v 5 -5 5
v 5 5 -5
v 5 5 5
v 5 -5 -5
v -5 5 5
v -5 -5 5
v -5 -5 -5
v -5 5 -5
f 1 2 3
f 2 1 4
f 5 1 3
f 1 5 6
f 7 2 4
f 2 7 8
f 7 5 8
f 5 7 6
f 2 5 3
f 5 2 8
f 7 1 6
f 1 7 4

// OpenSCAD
// -------------------------------------+---------------------------------------+---------------------------------------+---------------------------------------
// Title:        Parametric Test Block
// Version:      1.0
// Release Date: 2017-04-02 (ISO)
// Author:       Rohin Gosling
// -------------------------------------+---------------------------------------+---------------------------------------+---------------------------------------
//
// Description:
//
// - Simple 3D object generator, to generate test and calibration parts for 3D printers.
//
// Release Notes:
//
// - Version 1.0
//   * Model created.
//
// -------------------------------------+---------------------------------------+---------------------------------------+---------------------------------------

// -------------------------------------+---------------------------------------+---------------------------------------+---------------------------------------
// Constants:
// -------------------------------------+---------------------------------------+---------------------------------------+---------------------------------------

// System constants.

C_CONSTANT = 0 + 0;     // Used to hide constant values from Thingiverse. Add to other constants to hide them as well.

// General constants.

C_NONE = C_CONSTANT + 0;

// SCG constants.

SCG_OVERLAP = C_CONSTANT + 0.01;    // Used for overlapping Boolean operations in order to avoid Boolean edge artefacts.

// Shape

C_SHAPE_NONE      = C_CONSTANT + 0;
C_SHAPE_CUBOID    = C_CONSTANT + 1;
C_SHAPE_CYLINDER  = C_CONSTANT + 2;
C_SHAPE_PYRAMID   = C_CONSTANT + 3;
C_SHAPE_PRISM     = C_CONSTANT + 4;
C_SHAPE_ELLIPSOID = C_CONSTANT + 5;
C_SHAPE_TORUS     = C_CONSTANT + 6;

// Minimum and maximum constraints.

C_RESOLUTION_MIN  = C_CONSTANT + 8;
C_RESOLUTION_MAX  = C_CONSTANT + 64;
C_SIZE_MIN        = C_CONSTANT + 1.0;
C_SIDE_COUNT_MIN  = C_CONSTANT + 3;
C_SIDE_COUNT_MAX  = C_CONSTANT + 12;


// -------------------------------------+---------------------------------------+---------------------------------------+---------------------------------------
// Thingiverse Parameters.
//
// - These parameters are used to integrate with the Thingiverse Customizer, and should only be used by the
//   class member variables specified in the "Model parameters" section below.
//
// - These Thingiverse Parameters should never be accessed from inside any module. We do this to enforce 
//   principles of object orientation.
//
// - By separating concerns between variables exposed to Thingiverse vs. variables used internally by the 
//   SCAD model (class), we are better able to manage the ordering and grouping of variables exposed to 
//   Thingiverse, vs. the ordering and constraints of variables used internally by the model.
//
// -------------------------------------+---------------------------------------+---------------------------------------+---------------------------------------

/* [Assembbly Parameters] */

object_shape    = 1;        // [ 1:Cuboid, 2:Cylinder, 3:Pyramid, 4:Prism, 5:Ellipsoid, 6:Torus ]
x_bore_shape    = 0;        // [ 0: None, 2:Cylinder, 4:Prism ]
y_bore_shape    = 0;        // [ 0: None, 2:Cylinder, 4:Prism ]
z_bore_shape    = 0;        // [ 0: None, 2:Cylinder, 4:Prism ]
resolution      = 128;

/* [Cuboid Parameters] */

cuboid_x      = 10.0;
cuboid_y      = 10.0;
cuboid_z      = 10.0;
cuboid_fillet = 0.0;

/* [Cylinder Parameters] */

cylinder_diameter_base = 20.0;
cylinder_diameter_top  = 20.0;
cylinder_height        = 20.0;

/* [Pyramid Parameters] */

pyramid_side_count  = 4;
pyramid_side_length = 20.0;
pyramid_height      = 20.0;

/* [Prism Parameters] */

prism_side_count  = 3;
prism_side_length = 20.0;
prism_height      = 20.0;

/* [Ellipsoid Parameters] */

ellipsoid_diameter_x = 20.0;
ellipsoid_diameter_y = 20.0;
ellipsoid_diameter_z = 20.0;

/* [Torus Parameters] */

torus_major_radius = 12.0;
torus_minor_radius = 6.0;

/* [Bore Parameters] */

x_bore_diameter         = 10;
y_bore_diameter         = 10;
z_bore_diameter         = 10;
x_bore_prism_side_count = 4;
y_bore_prism_side_count = 4;
z_bore_prism_side_count = 4;

// -------------------------------------+---------------------------------------+---------------------------------------+---------------------------------------
// Model parameters and geometric constraints. (Class member variables).
//
// - If we treat an OpenSCAD file as though it is an object oriented class, then we can prefix global variables
//   with "m_", to denote class membership. 
//   - As an alternative to "m_", we could also use "this_" as a standard. However, "m_" is shorter and faster to type.
//   - Another advantage of this convention, is that we can arrange parameters meant for display in Thingiverse, in 
//     an order that makes sense to the user, while arranging the member versions of the parameters in an order
//     that better accommodates constraint computation.
//
// - Once we have defined global variables as member variables of a class, in this case the class represented
//   by the SCAD file, then we are free to better manage global vs local scope of class member 
//   variables, vs. local module (method) variables.
//
// - Thingiverse only integrates constant literal values. So as long as we reference other parameters or 
//   initialize variables as expressions, then none of these will appear in the Thingiverse customizer.
//
// -------------------------------------+---------------------------------------+---------------------------------------+---------------------------------------

// Assembly Parameters

m_object_shape    = object_shape;
m_x_bore_shape    = x_bore_shape;
m_y_bore_shape    = y_bore_shape;
m_z_bore_shape    = z_bore_shape;
m_resolution      = clip ( resolution, C_RESOLUTION_MIN, C_RESOLUTION_MAX );

// Cuboid Parameters.

m_cuboid_x             = ( cuboid_x < C_SIZE_MIN ) ? C_SIZE_MIN : cuboid_x;
m_cuboid_y             = ( cuboid_y < C_SIZE_MIN ) ? C_SIZE_MIN : cuboid_y;
m_cuboid_z             = ( cuboid_z < C_SIZE_MIN ) ? C_SIZE_MIN : cuboid_z;
m_cuboid_min_dimention = ( m_cuboid_x < m_cuboid_y && m_cuboid_x < m_cuboid_z ) ? m_cuboid_x : ( m_cuboid_y < m_cuboid_x && m_cuboid_y < m_cuboid_z ) ? m_cuboid_y : m_cuboid_z;
m_cuboid_fillet        = clip ( cuboid_fillet, 0.0, m_cuboid_min_dimention/2.0 );

// Cylinder Parameters.

m_cylinder_diameter_base = ( cylinder_diameter_base < 0.0 ) ? 0.0 : cylinder_diameter_base;
m_cylinder_diameter_top  = ( cylinder_diameter_top  < 0.0 ) ? 0.0 : cylinder_diameter_top;
m_cylinder_height        = ( cylinder_height < C_SIZE_MIN ) ? C_SIZE_MIN : cylinder_height;

// Pyramid Parameters.

m_pyramid_side_count  = clip ( pyramid_side_count, C_SIDE_COUNT_MIN, C_SIDE_COUNT_MAX );
m_pyramid_side_length = ( pyramid_side_length < C_SIZE_MIN ) ? C_SIZE_MIN : pyramid_side_length;
m_pyramid_height      = ( pyramid_height < C_SIZE_MIN ) ? C_SIZE_MIN : pyramid_height;

// Prism Parameters.

m_prism_side_count  = clip ( prism_side_count, C_SIDE_COUNT_MIN, C_SIDE_COUNT_MAX );
m_prism_side_length = ( prism_side_length < C_SIZE_MIN ) ? C_SIZE_MIN : prism_side_length;
m_prism_height      = ( prism_height < C_SIZE_MIN ) ? C_SIZE_MIN : prism_height;

// Ellipsoid Parameters.

m_ellipsoid_diameter_x = ( ellipsoid_diameter_x < C_SIZE_MIN ) ? C_SIZE_MIN : ellipsoid_diameter_x;
m_ellipsoid_diameter_y = ( ellipsoid_diameter_y < C_SIZE_MIN ) ? C_SIZE_MIN : ellipsoid_diameter_y;
m_ellipsoid_diameter_z = ( ellipsoid_diameter_z < C_SIZE_MIN ) ? C_SIZE_MIN : ellipsoid_diameter_z;

// Torus Parameters.

m_torus_major_radius = ( torus_major_radius < C_SIZE_MIN ) ? C_SIZE_MIN : torus_major_radius;
m_torus_minor_radius = ( torus_minor_radius < C_SIZE_MIN ) ? C_SIZE_MIN : torus_minor_radius;

// Bore.

m_x_bore_diameter         = ( x_bore_diameter < C_SIZE_MIN ) ? C_SIZE_MIN : x_bore_diameter;
m_y_bore_diameter         = ( y_bore_diameter < C_SIZE_MIN ) ? C_SIZE_MIN : y_bore_diameter;
m_z_bore_diameter         = ( z_bore_diameter < C_SIZE_MIN ) ? C_SIZE_MIN : z_bore_diameter;
m_x_bore_prism_side_count = clip ( x_bore_prism_side_count, C_SIDE_COUNT_MIN, C_SIDE_COUNT_MAX );
m_y_bore_prism_side_count = clip ( y_bore_prism_side_count, C_SIDE_COUNT_MIN, C_SIDE_COUNT_MAX );
m_z_bore_prism_side_count = clip ( z_bore_prism_side_count, C_SIDE_COUNT_MIN, C_SIDE_COUNT_MAX );

// -------------------------------------+---------------------------------------+---------------------------------------+---------------------------------------
// DEBUG: Console Output. 
// -------------------------------------+---------------------------------------+---------------------------------------+---------------------------------------

C_DEBUG_ENABLED = false;

if ( C_DEBUG_ENABLED )
{
    //echo ( m_x = m_x ); 
}

// -------------------------------------+---------------------------------------+---------------------------------------+---------------------------------------
// Module:      Main
// Module Type: Model
//
// Description:
//
// - Program entry point.
//
// -------------------------------------+---------------------------------------+---------------------------------------+---------------------------------------

main();

module main ()
{   
    // Initialize model resolution.
    
    $fn = m_resolution;
    
    // Generate hinge assembly.
        
    assembly ();    
}

// -------------------------------------+---------------------------------------+---------------------------------------+---------------------------------------
// Module:      assembly_main
// Module Type: Assembly
//
// Description:
//
// - Main component assembly.
//
// Parameters:
//
// - N/A
//
// -------------------------------------+---------------------------------------+---------------------------------------+---------------------------------------

module assembly ()
{
    if      ( m_object_shape == C_SHAPE_NONE )      object_none ();
    else if ( m_object_shape == C_SHAPE_CUBOID )    object_cuboid ();
    else if ( m_object_shape == C_SHAPE_CYLINDER )  object_cylinder ();
    else if ( m_object_shape == C_SHAPE_PYRAMID )   object_pyramid ();
    else if ( m_object_shape == C_SHAPE_PRISM )     object_prism ();
    else if ( m_object_shape == C_SHAPE_ELLIPSOID ) object_ellipsoid ();
    else if ( m_object_shape == C_SHAPE_TORUS )     object_torus ();    
    else if ( m_object_shape == C_SHAPE_NONE )      object_none ();    
}

// -------------------------------------+---------------------------------------+---------------------------------------+---------------------------------------
// Module:      object_none
// Module Type: Object
//
// Description:
//
// - Placeholder module for dealing with zero object selection.
//
// Parameters:
//
// - N/A
//
// -------------------------------------+---------------------------------------+---------------------------------------+---------------------------------------

module object_none ()
{
}

// -------------------------------------+---------------------------------------+---------------------------------------+---------------------------------------
// Module:      object_cuboid
// Module Type: Object
//
// Description:
//
// - Cuboid object defined by width, length, height and fillet size.
//
// Parameters:
//
// - N/A
//
// -------------------------------------+---------------------------------------+---------------------------------------+---------------------------------------

module object_cuboid ()
{
    // Initialize parameters.
    
    sf = m_cuboid_fillet;
    sx = m_cuboid_x;
    sy = m_cuboid_y;
    sz = m_cuboid_z;
    
    // Generate object.

    difference ()
    {
        // Generate base object.
        
        if ( sf > 0 )
        {
            object_cuboid_filleted ();
        }
        else
        {
            cube ( size = [ sx, sy, sz ], center = true );
        }
        
        // Subtract bores.
        
        cutting_tool_bore ( sx, sy, sz );
    }
}

// -------------------------------------+---------------------------------------+---------------------------------------+---------------------------------------
// Module:      object_cuboid_filleted
// Module Type: Object
//
// Description:
//
// - Used by the Cuboid object, to implement fillets.
//
// Parameters:
//
// - N/A
//
// -------------------------------------+---------------------------------------+---------------------------------------+---------------------------------------

module object_cuboid_filleted ()
{
    // Local constants.
    
    EDGE_CENTER = 0;    
    EDGE_ANGLE  = 1;
    EDGE_LENGTH = 2;
    
    // Initialize parameters.
    
    sf = m_cuboid_fillet;
    sx = m_cuboid_x;
    sy = m_cuboid_y;
    sz = m_cuboid_z;
    
    // Generate object.

    difference ()
    {
        // Generate base object.
        
        union ()
        {
            // Create cube work pieces.
            
            c = 2.0*sf;
            cube ( size = [ sx,     sy - c, sz - c ], center = true );
            cube ( size = [ sx - c, sy - c, sz     ], center = true );
            cube ( size = [ sx - c, sy,     sz - c ], center = true );
            
            // Create fillets.
            
            rx = sx/2.0 - sf;
            ry = sy/2.0 - sf;
            rz = sz/2.0 - sf;
            
            ex = m_cuboid_x - 2.0*sf;
            ey = m_cuboid_y - 2.0*sf;;
            ez = m_cuboid_z - 2.0*sf;;
            
            // Create vertex fillets.
            
            n_vertex = 8;
            v_vertex =
            [
                [ rx, ry,  rz ],[ -rx, ry,  rz ], [ -rx, -ry,  rz ], [ rx, -ry,  rz ],
                [ rx, ry, -rz ],[ -rx, ry, -rz ], [ -rx, -ry, -rz ], [ rx, -ry, -rz ]
            ];
                              
            for ( i = [ 0 : n_vertex - 1 ] )
            {
                translate ( v_vertex [ i ] ) sphere ( r = sf, center = true );
            }
            
            // Create edge fillets.
            
            n_edge = 12;
            v_edge =
            [
                [ [  rx,  ry, 0.0 ], [  0.0,  0.0, 0.0 ], ez ], [ [ -rx,  ry, 0.0 ], [  0.0,  0.0, 0.0 ], ez ],
                [ [  rx, -ry, 0.0 ], [  0.0,  0.0, 0.0 ], ez ], [ [ -rx, -ry, 0.0 ], [  0.0,  0.0, 0.0 ], ez ],
                [ [  rx, 0.0,  rz ], [ 90.0,  0.0, 0.0 ], ey ], [ [  rx, 0.0, -rz ], [ 90.0,  0.0, 0.0 ], ey ],
                [ [ -rx, 0.0,  rz ], [ 90.0,  0.0, 0.0 ], ey ], [ [ -rx, 0.0, -rz ], [ 90.0,  0.0, 0.0 ], ey ],
                [ [ 0.0,  ry,  rz ], [  0.0, 90.0, 0.0 ], ex ], [ [ 0.0,  ry, -rz ], [  0.0, 90.0, 0.0 ], ex ],
                [ [ 0.0, -ry,  rz ], [  0.0, 90.0, 0.0 ], ex ], [ [ 0.0, -ry, -rz ], [  0.0, 90.0, 0.0 ], ex ]
            ];
            
            for ( i = [ 0 : n_edge - 1 ] )
            {
                v = v_edge [ i ][ EDGE_CENTER ];
                a = v_edge [ i ][ EDGE_ANGLE  ];
                s = v_edge [ i ][ EDGE_LENGTH ];
                
                echo ( a = a );
                
                translate ( v ) rotate ( a ) cylinder ( r = sf, h = s, center = true );
            }
            
        }
        
        // Subtract bores.
        
        cutting_tool_bore ( sx, sy, sz );
    }
}

// -------------------------------------+---------------------------------------+---------------------------------------+---------------------------------------
// Module:      object_cylinder
// Module Type: Object
//
// Description:
//
// - Cylinder object defined by base diameter, top diameter and height.
//
// Parameters:
//
// - N/A
//
// -------------------------------------+---------------------------------------+---------------------------------------+---------------------------------------

module object_cylinder ()
{
    // Initialize parameters.
    
    d1 = m_cylinder_diameter_base;
    d2 = m_cylinder_diameter_top;
    h  = m_cylinder_height;
    
    // Generate object.
    
    difference ()
    {
        // Generate base object.
        
        cylinder ( d1 = d1, d2 = d2, h = h, center = true );
        
        // Subtract bores.
        
        d_max = ( d1 > d2 ) ? d1 : d2;
        cutting_tool_bore ( sx = d_max, sy = d_max, sz = h );
    }
}

// -------------------------------------+---------------------------------------+---------------------------------------+---------------------------------------
// Module:      object_pyramid
// Module Type: Object
//
// Description:
//
// - Pyramid object defined by height, side length, and side count.
//
// Parameters:
//
// - N/A
//
// -------------------------------------+---------------------------------------+---------------------------------------+---------------------------------------

module object_pyramid ()
{
    // Initialize parameters.
    
    n = m_pyramid_side_count;    
    s = m_pyramid_side_length;
    h = m_pyramid_height;
    t = 180/n;
    
    // Compute base diameter based on side length.
        
    d1 = s/sin(180/n);
    d2 = 0;
    
    // Generate object.
    
    difference ()
    {
        // Generate base object.
        
        rotate ( [ 0, 0, t ] ) cylinder ( d1 = d1, d2 = d2, h = h, $fn = n, center = true );
        
        // Subtract bores.
        
        d_max = ( d1 > d2 ) ? d1 : d2;
        translate ( [ 0, 0, -h/5 ] ) cutting_tool_bore ( sx = d_max, sy = d_max, sz = 2*h );
    }
}

// -------------------------------------+---------------------------------------+---------------------------------------+---------------------------------------
// Module:      object_prism
// Module Type: Object
//
// Description:
//
// - Prism object defined by height, side length, and side count.
//
// Parameters:
//
// - N/A
//
// -------------------------------------+---------------------------------------+---------------------------------------+---------------------------------------

module object_prism ()
{
    // Initialize parameters.
    
    n = m_prism_side_count;    
    s = m_prism_side_length;
    h = m_prism_height;
    t = 180/n;
    
    // Compute base diameter based on side length.
        
    d1 = s/sin(180/n);
    d2 = d1;
    
    // Generate object.
    
    difference ()
    {
        // Generate base object.
        
        rotate ( [ 0, 0, t ] ) cylinder ( d1 = d1, d2 = d2, h = h, $fn = n, center = true );
        
        // Subtract bores.
                
        cutting_tool_bore ( sx = d1, sy = d1, sz = h );
    }
}

// -------------------------------------+---------------------------------------+---------------------------------------+---------------------------------------
// Module:      object_ellipsoid
// Module Type: Object
//
// Description:
//
// - Ellipsoid object defined by width, length and height.
//
// Parameters:
//
// - N/A
//
// -------------------------------------+---------------------------------------+---------------------------------------+---------------------------------------

module object_ellipsoid ()
{
    // Compute ellipsoid scaling.
     
    d  = 1.0;     
    sx = m_ellipsoid_diameter_x;
    sy = m_ellipsoid_diameter_y;
    sz = m_ellipsoid_diameter_z;
    
    // Generate object.
    
    difference ()
    {
        // Generate base object.
        
        scale ( [ sx, sy, sz ] ) sphere ( d = d );
        
        // Subtract bores.
                
        cutting_tool_bore ( sx = sx, sy = sy, sz = sz );
    } 
}

// -------------------------------------+---------------------------------------+---------------------------------------+---------------------------------------
// Module:      object_torus
// Module Type: Object
//
// Description:
//
// - Torus object defined by major and minor radii.
//
// Parameters:
//
// - N/A
//
// -------------------------------------+---------------------------------------+---------------------------------------+---------------------------------------

module object_torus ()
{
    // Initialize parameters.
    
    R = m_torus_major_radius;
    r = m_torus_minor_radius;    
    
    // Generate object.
    
    difference ()
    {
        // Generate base object.
        
        rotate_extrude ()
        {
            translate ( [ R, 0, 0 ] ) circle ( r = r);
        }
        
        // Subtract bores.
        
        s  = 2*( r + R );
        sx = s;
        sy = s;
        sz = 2*r;
        
        cutting_tool_bore ( sx = sx, sy = sy, sz = sz );
    } 
}

// -------------------------------------+---------------------------------------+---------------------------------------+---------------------------------------
// Module:      cutting_tool_bore
// Module Type: Cutting tool
//
// Description:
//
// - Cutting tool used to cut the bore holes into the base object.
//
// Parameters:
//
// - N/A
//
// -------------------------------------+---------------------------------------+---------------------------------------+---------------------------------------

module cutting_tool_bore ( sx, sy, sz )
{
    nx = m_x_bore_prism_side_count;
    ny = m_y_bore_prism_side_count;
    nz = m_z_bore_prism_side_count;
    
    txo = ( nx == 6 ) ? 90.0 :   0.0;
    tyo = ( ny == 6 ) ? 0.0  : -90.0;
    
    tx = 180/nx + txo;
    ty = 180/ny + tyo;
    tz = 180/nz;
            
    // Subtract cylindrical bores.
        
    if ( m_x_bore_shape == C_SHAPE_CYLINDER ) rotate ( [ 0, 90, 0 ] ) cylinder ( d = m_x_bore_diameter, h = sx + SCG_OVERLAP, center = true );
    if ( m_y_bore_shape == C_SHAPE_CYLINDER ) rotate ( [ 90, 0, 0 ] ) cylinder ( d = m_y_bore_diameter, h = sy + SCG_OVERLAP, center = true );
    if ( m_z_bore_shape == C_SHAPE_CYLINDER ) rotate ( [ 0,  0, 0 ] ) cylinder ( d = m_z_bore_diameter, h = sz + SCG_OVERLAP, center = true );
            
    // Subtract prisim bores.
    
    if ( m_x_bore_shape == C_SHAPE_PRISM ) rotate ( [ 0, 90, 0 ] ) rotate ( [ 0, 0, tx ] ) cylinder ( d = m_x_bore_diameter, h = sx + SCG_OVERLAP, $fn = nx, center = true );
    if ( m_y_bore_shape == C_SHAPE_PRISM ) rotate ( [ 90, 0, 0 ] ) rotate ( [ 0, 0, ty ] ) cylinder ( d = m_y_bore_diameter, h = sy + SCG_OVERLAP, $fn = ny, center = true );
    if ( m_z_bore_shape == C_SHAPE_PRISM ) rotate ( [ 0,  0, 0 ] ) rotate ( [ 0, 0, tz ] ) cylinder ( d = m_z_bore_diameter, h = sz + SCG_OVERLAP, $fn = nz, center = true );
}


// -------------------------------------+---------------------------------------+---------------------------------------+---------------------------------------
// Module:      Rectangle.
// Module Type: 2D Shape.
//
// Description:
//
// - Creates a 2D rectangle.
//
// Parameters:
//
// - w
//   Rectangle width.
//
// - h
//   Rectangle height.
//
// - center
//   Center the rectangle about the origin (0,0,0) if true, else place the rectangle in the positive quadrant.
//
// -------------------------------------+---------------------------------------+---------------------------------------+---------------------------------------

module fillet_rectangle ( w, h, r, center )
{
    xs = w - 2*r;
    ys = h - 2*r;
    xd = w/2.0 - r;  
    yd = h/2.0 - r;    
    
    union ()
    {
        scale ( [ xs, h  ] ) square ( size = 1.0, center = center );
        scale ( [ w,  ys ] ) square ( size = 1.0, center = center );
        translate ( [  xd,  yd ] ) circle ( r = r, center = center );
        translate ( [  xd, -yd ] ) circle ( r = r, center = center );
        translate ( [ -xd, -yd ] ) circle ( r = r, center = center );
        translate ( [ -xd,  yd ] ) circle ( r = r, center = center );
    }
}

// -------------------------------------+---------------------------------------+---------------------------------------+---------------------------------------
// Module:      Rectangle.
// Module Type: 2D Shape.
//
// Description:
//
// - Creates a 2D rectangle.
//
// Parameters:
//
// - w
//   Rectangle width.
//
// - h
//   Rectangle height.
//
// - center
//   Center the rectangle about the origin (0,0,0) if true, else place the rectangle in the positive quadrant.
//
// -------------------------------------+---------------------------------------+---------------------------------------+---------------------------------------

module rectangle ( w, h, center )
{
    scale ( [ w, h ] ) square ( size = 1.0, center = center );
}

// -------------------------------------+---------------------------------------+---------------------------------------+---------------------------------------
// Function: Clip
//
// Description:
//
// - Clips an input value, to a minimum and maximum value.
//
//   x_min ≤ x ≤ x_max
// 
// Parameters:
//
// - x
//   Input value.
//
// - x_min
//   Minimal value constraint. Any x less than x_min, is set to x_min. 
//
// - x_max
//   Maximum value constraint. Any x greater than x_max, is set to x_max.
//
// -------------------------------------+---------------------------------------+---------------------------------------+---------------------------------------

function clip ( x, x_min, x_max ) = ( x < x_min ) ? x_min : ( x > x_max ) ? x_max : x;


// -------------------------------------+---------------------------------------+---------------------------------------+---------------------------------------
// Function: funtion_name
//
// Description:
//
// - Function description.
//
// Return Value:
//
// - Description of return value.
//
// Parameters:
//
// - x
//   Argument x description.
//
// - y
//   Argument y description.
//
// -------------------------------------+---------------------------------------+---------------------------------------+---------------------------------------

// -------------------------------------+---------------------------------------+---------------------------------------+---------------------------------------
// Module:      module_name
// Module Type: [ 2D Shape, Profile, Tool, Workpiece, Component ] 
// Description:
//
// - Module description.
//
// Parameters:
//
// - x
//   Argument x description.
//
// - y
//   Argument y description.
//
// -------------------------------------+---------------------------------------+---------------------------------------+---------------------------------------
